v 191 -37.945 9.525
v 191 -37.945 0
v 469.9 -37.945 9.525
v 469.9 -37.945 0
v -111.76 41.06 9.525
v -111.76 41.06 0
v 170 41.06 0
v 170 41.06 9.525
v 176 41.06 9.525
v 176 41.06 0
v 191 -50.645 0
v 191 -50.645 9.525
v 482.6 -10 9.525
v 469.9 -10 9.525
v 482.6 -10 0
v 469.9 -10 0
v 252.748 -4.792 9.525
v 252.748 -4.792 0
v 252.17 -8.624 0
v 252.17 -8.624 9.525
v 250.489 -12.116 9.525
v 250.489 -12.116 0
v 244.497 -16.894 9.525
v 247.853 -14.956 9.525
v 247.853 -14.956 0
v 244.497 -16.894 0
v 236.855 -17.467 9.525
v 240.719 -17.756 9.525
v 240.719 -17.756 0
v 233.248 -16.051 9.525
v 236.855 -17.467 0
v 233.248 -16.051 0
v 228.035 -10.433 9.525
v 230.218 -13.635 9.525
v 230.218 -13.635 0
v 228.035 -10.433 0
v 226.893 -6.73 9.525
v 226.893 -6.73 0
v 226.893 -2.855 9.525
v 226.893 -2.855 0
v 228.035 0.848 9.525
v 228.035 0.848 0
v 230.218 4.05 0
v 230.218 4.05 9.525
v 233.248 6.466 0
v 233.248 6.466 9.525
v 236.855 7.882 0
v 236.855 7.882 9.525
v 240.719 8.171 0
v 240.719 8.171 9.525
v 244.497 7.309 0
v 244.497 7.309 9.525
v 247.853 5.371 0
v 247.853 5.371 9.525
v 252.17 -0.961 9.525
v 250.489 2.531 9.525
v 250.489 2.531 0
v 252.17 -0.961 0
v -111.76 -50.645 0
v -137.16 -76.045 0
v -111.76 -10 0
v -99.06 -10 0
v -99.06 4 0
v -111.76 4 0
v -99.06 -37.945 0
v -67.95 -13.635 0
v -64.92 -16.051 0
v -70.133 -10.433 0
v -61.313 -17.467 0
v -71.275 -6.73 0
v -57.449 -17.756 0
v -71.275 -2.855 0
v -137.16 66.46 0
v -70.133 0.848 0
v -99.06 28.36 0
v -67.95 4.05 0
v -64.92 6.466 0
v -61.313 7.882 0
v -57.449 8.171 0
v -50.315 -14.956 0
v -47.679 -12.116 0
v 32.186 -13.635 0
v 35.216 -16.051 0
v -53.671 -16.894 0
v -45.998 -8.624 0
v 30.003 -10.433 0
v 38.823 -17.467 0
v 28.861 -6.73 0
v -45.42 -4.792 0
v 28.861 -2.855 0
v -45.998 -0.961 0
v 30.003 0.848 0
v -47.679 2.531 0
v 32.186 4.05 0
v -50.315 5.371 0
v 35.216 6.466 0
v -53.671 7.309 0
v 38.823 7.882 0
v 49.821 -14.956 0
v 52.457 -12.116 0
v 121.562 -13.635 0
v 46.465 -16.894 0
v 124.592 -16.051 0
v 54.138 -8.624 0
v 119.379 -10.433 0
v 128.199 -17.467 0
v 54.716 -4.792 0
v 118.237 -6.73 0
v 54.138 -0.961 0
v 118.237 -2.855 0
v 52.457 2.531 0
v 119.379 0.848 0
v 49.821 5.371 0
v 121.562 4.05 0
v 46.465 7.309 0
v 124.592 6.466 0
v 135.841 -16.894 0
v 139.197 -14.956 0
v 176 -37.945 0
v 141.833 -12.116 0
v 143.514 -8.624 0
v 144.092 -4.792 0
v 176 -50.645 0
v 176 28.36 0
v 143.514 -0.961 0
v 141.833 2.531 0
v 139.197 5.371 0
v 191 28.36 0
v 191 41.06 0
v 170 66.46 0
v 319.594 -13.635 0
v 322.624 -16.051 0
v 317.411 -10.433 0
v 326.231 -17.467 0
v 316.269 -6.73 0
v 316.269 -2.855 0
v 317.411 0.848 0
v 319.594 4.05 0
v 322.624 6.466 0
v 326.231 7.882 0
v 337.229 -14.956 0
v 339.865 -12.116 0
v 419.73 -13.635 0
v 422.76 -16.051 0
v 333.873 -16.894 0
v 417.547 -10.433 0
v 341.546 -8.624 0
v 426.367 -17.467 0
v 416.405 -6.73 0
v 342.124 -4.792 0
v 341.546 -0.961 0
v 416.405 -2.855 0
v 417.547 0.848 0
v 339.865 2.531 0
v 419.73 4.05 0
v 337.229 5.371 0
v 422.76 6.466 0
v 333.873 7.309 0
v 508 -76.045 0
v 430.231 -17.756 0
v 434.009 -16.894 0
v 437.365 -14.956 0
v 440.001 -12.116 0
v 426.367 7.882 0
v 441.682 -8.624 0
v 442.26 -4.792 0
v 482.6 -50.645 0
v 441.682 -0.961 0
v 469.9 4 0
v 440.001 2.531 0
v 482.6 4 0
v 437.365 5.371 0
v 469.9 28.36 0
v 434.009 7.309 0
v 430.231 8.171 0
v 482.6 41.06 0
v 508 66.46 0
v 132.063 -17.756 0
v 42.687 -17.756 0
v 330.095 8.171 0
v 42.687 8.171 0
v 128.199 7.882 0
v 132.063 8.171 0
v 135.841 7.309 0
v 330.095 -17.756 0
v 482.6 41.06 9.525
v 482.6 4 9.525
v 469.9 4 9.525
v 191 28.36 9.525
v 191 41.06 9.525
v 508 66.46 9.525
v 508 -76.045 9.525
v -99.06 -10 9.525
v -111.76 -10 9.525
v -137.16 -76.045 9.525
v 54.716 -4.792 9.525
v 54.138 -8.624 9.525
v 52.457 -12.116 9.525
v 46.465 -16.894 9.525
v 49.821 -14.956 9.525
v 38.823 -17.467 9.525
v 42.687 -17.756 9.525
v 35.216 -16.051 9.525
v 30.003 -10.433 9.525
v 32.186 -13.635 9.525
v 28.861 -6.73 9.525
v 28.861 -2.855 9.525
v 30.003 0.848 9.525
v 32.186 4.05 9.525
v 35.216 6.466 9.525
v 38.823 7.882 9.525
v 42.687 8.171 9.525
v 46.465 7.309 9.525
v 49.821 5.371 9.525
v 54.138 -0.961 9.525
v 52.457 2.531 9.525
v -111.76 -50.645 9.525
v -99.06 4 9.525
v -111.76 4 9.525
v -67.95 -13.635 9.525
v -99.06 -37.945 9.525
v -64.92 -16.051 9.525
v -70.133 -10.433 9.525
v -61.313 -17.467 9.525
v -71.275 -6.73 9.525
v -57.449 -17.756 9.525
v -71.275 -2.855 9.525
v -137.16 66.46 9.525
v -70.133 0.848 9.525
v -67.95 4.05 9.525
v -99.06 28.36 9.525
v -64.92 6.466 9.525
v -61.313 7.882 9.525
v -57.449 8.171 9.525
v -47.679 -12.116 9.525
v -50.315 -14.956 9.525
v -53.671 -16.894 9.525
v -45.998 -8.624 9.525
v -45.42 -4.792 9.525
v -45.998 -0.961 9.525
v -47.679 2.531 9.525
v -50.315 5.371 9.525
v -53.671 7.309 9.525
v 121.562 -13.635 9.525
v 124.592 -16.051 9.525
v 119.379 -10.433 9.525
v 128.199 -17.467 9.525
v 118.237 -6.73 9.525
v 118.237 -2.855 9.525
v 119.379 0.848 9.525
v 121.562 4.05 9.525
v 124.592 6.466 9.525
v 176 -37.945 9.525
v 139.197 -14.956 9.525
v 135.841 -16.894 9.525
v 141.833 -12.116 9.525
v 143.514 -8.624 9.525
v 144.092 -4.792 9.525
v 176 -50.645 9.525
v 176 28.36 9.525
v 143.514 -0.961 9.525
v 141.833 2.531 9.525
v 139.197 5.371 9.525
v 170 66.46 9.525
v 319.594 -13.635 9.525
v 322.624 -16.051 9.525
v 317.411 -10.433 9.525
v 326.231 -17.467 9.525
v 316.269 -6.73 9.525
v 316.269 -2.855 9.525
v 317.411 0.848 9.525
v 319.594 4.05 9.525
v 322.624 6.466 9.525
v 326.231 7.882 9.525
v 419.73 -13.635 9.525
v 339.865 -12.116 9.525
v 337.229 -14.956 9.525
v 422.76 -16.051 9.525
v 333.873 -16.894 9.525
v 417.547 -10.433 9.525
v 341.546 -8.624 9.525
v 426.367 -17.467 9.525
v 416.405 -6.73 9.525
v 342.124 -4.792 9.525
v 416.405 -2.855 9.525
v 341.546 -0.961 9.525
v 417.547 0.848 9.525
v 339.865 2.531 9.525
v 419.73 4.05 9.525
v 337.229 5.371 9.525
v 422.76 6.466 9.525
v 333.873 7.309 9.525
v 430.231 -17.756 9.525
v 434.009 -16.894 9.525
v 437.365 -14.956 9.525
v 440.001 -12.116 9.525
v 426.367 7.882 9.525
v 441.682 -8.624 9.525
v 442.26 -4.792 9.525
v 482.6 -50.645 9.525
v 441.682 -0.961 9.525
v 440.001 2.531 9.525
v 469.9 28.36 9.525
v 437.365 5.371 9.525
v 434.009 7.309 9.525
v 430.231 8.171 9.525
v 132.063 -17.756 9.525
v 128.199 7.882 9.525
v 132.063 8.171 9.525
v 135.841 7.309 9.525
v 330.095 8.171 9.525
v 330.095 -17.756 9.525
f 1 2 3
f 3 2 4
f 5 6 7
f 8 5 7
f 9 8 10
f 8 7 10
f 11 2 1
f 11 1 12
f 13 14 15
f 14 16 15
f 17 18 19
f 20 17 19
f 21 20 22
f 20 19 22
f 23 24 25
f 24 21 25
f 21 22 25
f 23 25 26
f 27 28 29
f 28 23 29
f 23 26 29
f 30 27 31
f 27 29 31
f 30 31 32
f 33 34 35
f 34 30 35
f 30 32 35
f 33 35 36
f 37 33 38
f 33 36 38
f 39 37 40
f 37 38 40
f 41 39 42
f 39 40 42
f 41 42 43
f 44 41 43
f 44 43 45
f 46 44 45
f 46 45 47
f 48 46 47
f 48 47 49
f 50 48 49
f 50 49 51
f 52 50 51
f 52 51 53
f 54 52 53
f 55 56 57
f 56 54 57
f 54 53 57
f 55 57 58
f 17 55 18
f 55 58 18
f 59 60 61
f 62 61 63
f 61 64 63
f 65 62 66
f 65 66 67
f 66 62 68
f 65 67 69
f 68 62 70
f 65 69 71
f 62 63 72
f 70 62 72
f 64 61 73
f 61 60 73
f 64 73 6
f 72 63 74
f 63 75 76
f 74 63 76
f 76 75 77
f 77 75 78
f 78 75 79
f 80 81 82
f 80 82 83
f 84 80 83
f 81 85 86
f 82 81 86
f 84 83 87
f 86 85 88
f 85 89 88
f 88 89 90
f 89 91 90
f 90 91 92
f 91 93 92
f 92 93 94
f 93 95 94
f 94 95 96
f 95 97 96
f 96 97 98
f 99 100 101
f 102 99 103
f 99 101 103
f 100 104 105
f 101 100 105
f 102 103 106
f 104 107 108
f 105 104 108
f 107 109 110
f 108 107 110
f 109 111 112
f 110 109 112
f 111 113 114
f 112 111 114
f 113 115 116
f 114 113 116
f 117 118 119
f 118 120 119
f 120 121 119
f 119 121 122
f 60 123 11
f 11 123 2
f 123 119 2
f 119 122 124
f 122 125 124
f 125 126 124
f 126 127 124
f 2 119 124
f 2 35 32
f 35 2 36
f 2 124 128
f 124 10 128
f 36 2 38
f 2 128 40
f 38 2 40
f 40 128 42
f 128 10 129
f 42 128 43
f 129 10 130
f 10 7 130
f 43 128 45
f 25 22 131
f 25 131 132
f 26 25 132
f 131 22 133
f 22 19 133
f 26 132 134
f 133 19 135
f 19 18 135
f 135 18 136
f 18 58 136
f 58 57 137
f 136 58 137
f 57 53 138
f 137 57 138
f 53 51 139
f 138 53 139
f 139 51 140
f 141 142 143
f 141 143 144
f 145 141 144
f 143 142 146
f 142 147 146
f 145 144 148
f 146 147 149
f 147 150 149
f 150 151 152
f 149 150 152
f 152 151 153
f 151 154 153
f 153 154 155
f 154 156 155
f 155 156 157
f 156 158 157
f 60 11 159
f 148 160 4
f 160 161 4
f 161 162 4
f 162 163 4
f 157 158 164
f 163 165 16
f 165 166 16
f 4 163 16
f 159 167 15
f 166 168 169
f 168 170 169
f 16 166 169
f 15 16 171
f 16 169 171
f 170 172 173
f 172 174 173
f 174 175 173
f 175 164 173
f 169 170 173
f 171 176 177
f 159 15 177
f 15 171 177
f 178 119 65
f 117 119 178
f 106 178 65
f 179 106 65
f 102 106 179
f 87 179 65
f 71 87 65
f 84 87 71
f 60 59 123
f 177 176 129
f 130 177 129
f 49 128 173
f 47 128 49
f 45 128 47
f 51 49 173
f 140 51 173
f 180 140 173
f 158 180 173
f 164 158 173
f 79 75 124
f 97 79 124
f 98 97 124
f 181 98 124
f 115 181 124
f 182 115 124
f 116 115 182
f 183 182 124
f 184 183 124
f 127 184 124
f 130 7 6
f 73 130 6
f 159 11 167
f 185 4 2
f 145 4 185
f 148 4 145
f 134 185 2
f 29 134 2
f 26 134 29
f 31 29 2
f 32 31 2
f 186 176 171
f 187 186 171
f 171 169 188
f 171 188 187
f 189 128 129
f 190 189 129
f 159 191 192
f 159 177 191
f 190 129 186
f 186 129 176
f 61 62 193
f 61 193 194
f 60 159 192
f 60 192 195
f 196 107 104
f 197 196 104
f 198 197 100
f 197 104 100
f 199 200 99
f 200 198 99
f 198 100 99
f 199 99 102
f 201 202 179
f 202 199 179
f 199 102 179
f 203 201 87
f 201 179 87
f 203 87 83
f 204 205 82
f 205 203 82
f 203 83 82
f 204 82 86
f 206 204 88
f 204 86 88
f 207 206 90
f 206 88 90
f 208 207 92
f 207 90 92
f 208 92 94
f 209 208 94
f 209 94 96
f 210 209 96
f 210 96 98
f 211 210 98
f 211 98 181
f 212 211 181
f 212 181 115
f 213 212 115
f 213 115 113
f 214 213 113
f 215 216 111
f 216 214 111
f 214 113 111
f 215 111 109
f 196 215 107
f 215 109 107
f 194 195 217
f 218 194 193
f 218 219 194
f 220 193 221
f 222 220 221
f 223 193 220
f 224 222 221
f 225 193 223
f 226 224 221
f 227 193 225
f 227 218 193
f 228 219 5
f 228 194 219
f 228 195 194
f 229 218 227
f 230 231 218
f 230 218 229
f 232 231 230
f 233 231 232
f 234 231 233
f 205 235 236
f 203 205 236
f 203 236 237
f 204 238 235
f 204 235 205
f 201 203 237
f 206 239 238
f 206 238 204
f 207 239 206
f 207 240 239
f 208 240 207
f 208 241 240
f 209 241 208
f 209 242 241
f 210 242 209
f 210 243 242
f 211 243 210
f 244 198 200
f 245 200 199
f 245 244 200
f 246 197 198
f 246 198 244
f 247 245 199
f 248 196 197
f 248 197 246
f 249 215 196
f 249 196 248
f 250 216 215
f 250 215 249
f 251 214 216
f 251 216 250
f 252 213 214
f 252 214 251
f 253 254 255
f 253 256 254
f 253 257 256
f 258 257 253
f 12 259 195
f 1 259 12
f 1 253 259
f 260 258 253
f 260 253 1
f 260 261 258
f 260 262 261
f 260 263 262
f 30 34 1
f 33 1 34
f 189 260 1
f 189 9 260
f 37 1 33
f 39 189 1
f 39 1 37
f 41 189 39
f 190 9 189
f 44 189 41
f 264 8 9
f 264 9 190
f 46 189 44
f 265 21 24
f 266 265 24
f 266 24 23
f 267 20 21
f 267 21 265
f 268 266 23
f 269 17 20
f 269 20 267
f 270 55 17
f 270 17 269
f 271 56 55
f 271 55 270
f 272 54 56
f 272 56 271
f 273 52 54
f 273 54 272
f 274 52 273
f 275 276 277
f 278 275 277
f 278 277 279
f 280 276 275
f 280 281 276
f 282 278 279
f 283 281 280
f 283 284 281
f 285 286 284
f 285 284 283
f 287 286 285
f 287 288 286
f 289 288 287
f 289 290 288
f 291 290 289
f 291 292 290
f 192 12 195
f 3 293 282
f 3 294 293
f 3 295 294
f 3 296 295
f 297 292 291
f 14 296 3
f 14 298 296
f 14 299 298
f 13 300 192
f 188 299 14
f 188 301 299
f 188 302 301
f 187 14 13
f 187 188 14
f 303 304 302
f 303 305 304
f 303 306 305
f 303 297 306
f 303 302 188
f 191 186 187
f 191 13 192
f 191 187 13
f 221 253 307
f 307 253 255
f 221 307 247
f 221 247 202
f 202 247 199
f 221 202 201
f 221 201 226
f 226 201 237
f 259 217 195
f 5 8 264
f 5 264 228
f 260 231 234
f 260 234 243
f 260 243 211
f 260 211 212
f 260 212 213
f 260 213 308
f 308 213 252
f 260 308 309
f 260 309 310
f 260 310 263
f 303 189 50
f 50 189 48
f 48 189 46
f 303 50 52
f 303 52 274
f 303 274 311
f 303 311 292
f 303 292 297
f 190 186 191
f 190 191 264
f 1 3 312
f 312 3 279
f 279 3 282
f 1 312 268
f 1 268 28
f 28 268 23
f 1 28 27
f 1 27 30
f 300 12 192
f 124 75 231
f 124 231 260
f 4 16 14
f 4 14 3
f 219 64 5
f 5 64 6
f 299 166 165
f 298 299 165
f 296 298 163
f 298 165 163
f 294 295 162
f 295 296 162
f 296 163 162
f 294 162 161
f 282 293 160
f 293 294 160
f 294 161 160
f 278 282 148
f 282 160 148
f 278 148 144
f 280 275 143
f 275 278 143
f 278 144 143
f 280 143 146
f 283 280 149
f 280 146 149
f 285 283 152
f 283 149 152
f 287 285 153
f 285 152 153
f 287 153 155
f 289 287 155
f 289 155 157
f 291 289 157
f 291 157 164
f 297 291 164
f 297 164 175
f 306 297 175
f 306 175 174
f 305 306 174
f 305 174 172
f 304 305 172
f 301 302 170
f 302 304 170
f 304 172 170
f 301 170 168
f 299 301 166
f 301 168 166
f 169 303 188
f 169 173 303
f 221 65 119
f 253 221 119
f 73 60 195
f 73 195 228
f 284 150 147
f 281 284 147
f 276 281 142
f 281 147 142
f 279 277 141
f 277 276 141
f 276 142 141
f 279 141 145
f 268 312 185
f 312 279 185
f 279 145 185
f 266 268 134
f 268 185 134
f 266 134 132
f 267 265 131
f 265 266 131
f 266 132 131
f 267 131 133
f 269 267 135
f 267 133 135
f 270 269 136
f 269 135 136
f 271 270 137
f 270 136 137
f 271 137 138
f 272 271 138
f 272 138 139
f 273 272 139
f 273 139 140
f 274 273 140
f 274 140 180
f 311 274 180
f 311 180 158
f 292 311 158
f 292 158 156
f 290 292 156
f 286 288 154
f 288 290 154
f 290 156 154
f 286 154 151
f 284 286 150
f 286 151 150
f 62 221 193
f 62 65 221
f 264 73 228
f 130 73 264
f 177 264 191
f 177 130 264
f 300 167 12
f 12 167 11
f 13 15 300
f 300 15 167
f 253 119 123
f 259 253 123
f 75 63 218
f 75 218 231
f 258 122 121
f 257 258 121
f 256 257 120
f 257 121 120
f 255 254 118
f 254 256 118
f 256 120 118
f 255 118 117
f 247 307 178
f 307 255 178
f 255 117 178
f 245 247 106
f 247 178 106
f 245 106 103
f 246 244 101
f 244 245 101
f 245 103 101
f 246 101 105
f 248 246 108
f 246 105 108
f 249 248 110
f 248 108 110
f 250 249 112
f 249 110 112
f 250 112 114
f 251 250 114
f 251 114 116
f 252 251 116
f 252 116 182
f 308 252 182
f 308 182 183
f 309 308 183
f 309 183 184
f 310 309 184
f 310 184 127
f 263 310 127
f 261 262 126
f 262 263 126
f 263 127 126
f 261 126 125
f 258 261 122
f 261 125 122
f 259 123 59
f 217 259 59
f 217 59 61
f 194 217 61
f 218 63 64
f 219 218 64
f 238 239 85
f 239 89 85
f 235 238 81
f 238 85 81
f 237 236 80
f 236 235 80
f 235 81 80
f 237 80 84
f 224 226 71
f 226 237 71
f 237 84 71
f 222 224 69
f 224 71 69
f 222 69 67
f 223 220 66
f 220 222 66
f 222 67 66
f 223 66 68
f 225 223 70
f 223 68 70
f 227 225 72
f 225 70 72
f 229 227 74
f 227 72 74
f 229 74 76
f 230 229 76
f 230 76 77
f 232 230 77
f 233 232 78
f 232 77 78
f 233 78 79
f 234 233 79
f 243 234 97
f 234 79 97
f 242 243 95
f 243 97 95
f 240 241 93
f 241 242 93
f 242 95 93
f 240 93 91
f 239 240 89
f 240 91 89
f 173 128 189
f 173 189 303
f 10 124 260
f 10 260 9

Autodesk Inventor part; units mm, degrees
ref_plane "YZ Plane" through (0, 0, 0) normal (1, 0, 0) x (0, 1, 0)
ref_plane "XZ Plane" through (0, 0, 0) normal (0, 1, 0) x (-1, 0, 0)
ref_plane "XY Plane" through (0, 0, 0) normal (0, 0, 1) x (1, 0, 0)
sketch "Sketch1" plane through (0, 0, 0) normal (0, 0, 1) x (1, 0, 0)
  line L0 (469.9, 22.205) -> (469.9, -34.945)
  line L1 (-99.06, -34.945) -> (-99.06, 22.205)
  circle A0 centre (-58.42, -4.7925) radius 13
  circle A1 centre (41.716, -4.7925) radius 13
  circle A2 centre (131.092, -4.7925) radius 13
  circle A3 centre (429.26, -4.7925) radius 13
  circle A4 centre (329.124, -4.7925) radius 13
  circle A5 centre (239.748, -4.7925) radius 13
  line L2 (-99.06, 28.36) -> (469.9, 28.36)
  line L3 (-99.06, -37.945) -> (469.9, -37.945)
  line L4 (-99.06, 22.205) -> (-99.06, 28.36)
  line L5 (-99.06, -37.945) -> (-99.06, -34.945)
  line L6 (469.9, -37.945) -> (469.9, -34.945)
  line L7 (469.9, 22.205) -> (469.9, 28.36)
  line L8 (-111.76, 41.06) -> (482.6, 41.06)
  line L9 (482.6, 41.06) -> (482.6, -50.645)
  line L10 (482.6, -50.645) -> (-111.76, -50.645)
  line L11 (-111.76, -50.645) -> (-111.76, 41.06)
  line L12 (508, 63.305) -> (508, -76.045)
  line L13 (508, -76.045) -> (-137.16, -76.045)
  line L14 (-137.16, -76.045) -> (-137.16, 63.305)
  line L15 (170, 41.06) -> (170, 66.46)
  line L16 (-137.16, 66.46) -> (508, 66.46)
  line L17 (508, 66.46) -> (508, 63.305)
  line L18 (-137.16, 66.46) -> (-137.16, 62)
  line L19 (-99.06, 4) -> (-111.76, 4)
  line L20 (-99.06, -10) -> (-111.76, -10)
  line L21 (176, 28.36) -> (176, 41.06)
  line L22 (191, 28.36) -> (191, 41.06)
  line L23 (176, -37.945) -> (176, -50.645)
  line L24 (191, -37.945) -> (191, -50.645)
  line L25 (469.9, 4) -> (482.6, 4)
  line L26 (469.9, -10) -> (482.6, -10)
  point P0 (0, 0)
  dimension "d4" = 26
  dimension "d6" = 26
  dimension "d8" = 26
  dimension "d10" = 26
  dimension "d12" = 26
  dimension "d14" = 26
  dimension "d16" = 568.96
  dimension "d18" = 40.64
  dimension "d19" = 140.776
  dimension "d20" = 230.152
  dimension "d21" = 230.152
  dimension "d22" = 40.64
  dimension "d23" = 140.776
  dimension "d29" = 66.305
  dimension "d45" = 33.1525
  dimension "d46" = 33.1525
  dimension "d47" = 33.1525
  dimension "d48" = 33.1525
  dimension "d49" = 33.1525
  dimension "d50" = 33.1525
  dimension "d52" = 12.7
  dimension "d53" = 12.7
  dimension "d54" = 25.4
  dimension "d56" = 25.4
  dimension "d57" = 15
extrude "Extrusion4" add sketch "Sketch1" along normal blind 9.525 contours L0 L6 L3 L5 L1 L4 L2 L7 | L25 L9 L26 L0 | L16 L17 L12 L13 L14 L18 | L2 L21 L8 L22 | L24 L10 L23 L3 | L1 L20 L11 L19
properties part number "side"
